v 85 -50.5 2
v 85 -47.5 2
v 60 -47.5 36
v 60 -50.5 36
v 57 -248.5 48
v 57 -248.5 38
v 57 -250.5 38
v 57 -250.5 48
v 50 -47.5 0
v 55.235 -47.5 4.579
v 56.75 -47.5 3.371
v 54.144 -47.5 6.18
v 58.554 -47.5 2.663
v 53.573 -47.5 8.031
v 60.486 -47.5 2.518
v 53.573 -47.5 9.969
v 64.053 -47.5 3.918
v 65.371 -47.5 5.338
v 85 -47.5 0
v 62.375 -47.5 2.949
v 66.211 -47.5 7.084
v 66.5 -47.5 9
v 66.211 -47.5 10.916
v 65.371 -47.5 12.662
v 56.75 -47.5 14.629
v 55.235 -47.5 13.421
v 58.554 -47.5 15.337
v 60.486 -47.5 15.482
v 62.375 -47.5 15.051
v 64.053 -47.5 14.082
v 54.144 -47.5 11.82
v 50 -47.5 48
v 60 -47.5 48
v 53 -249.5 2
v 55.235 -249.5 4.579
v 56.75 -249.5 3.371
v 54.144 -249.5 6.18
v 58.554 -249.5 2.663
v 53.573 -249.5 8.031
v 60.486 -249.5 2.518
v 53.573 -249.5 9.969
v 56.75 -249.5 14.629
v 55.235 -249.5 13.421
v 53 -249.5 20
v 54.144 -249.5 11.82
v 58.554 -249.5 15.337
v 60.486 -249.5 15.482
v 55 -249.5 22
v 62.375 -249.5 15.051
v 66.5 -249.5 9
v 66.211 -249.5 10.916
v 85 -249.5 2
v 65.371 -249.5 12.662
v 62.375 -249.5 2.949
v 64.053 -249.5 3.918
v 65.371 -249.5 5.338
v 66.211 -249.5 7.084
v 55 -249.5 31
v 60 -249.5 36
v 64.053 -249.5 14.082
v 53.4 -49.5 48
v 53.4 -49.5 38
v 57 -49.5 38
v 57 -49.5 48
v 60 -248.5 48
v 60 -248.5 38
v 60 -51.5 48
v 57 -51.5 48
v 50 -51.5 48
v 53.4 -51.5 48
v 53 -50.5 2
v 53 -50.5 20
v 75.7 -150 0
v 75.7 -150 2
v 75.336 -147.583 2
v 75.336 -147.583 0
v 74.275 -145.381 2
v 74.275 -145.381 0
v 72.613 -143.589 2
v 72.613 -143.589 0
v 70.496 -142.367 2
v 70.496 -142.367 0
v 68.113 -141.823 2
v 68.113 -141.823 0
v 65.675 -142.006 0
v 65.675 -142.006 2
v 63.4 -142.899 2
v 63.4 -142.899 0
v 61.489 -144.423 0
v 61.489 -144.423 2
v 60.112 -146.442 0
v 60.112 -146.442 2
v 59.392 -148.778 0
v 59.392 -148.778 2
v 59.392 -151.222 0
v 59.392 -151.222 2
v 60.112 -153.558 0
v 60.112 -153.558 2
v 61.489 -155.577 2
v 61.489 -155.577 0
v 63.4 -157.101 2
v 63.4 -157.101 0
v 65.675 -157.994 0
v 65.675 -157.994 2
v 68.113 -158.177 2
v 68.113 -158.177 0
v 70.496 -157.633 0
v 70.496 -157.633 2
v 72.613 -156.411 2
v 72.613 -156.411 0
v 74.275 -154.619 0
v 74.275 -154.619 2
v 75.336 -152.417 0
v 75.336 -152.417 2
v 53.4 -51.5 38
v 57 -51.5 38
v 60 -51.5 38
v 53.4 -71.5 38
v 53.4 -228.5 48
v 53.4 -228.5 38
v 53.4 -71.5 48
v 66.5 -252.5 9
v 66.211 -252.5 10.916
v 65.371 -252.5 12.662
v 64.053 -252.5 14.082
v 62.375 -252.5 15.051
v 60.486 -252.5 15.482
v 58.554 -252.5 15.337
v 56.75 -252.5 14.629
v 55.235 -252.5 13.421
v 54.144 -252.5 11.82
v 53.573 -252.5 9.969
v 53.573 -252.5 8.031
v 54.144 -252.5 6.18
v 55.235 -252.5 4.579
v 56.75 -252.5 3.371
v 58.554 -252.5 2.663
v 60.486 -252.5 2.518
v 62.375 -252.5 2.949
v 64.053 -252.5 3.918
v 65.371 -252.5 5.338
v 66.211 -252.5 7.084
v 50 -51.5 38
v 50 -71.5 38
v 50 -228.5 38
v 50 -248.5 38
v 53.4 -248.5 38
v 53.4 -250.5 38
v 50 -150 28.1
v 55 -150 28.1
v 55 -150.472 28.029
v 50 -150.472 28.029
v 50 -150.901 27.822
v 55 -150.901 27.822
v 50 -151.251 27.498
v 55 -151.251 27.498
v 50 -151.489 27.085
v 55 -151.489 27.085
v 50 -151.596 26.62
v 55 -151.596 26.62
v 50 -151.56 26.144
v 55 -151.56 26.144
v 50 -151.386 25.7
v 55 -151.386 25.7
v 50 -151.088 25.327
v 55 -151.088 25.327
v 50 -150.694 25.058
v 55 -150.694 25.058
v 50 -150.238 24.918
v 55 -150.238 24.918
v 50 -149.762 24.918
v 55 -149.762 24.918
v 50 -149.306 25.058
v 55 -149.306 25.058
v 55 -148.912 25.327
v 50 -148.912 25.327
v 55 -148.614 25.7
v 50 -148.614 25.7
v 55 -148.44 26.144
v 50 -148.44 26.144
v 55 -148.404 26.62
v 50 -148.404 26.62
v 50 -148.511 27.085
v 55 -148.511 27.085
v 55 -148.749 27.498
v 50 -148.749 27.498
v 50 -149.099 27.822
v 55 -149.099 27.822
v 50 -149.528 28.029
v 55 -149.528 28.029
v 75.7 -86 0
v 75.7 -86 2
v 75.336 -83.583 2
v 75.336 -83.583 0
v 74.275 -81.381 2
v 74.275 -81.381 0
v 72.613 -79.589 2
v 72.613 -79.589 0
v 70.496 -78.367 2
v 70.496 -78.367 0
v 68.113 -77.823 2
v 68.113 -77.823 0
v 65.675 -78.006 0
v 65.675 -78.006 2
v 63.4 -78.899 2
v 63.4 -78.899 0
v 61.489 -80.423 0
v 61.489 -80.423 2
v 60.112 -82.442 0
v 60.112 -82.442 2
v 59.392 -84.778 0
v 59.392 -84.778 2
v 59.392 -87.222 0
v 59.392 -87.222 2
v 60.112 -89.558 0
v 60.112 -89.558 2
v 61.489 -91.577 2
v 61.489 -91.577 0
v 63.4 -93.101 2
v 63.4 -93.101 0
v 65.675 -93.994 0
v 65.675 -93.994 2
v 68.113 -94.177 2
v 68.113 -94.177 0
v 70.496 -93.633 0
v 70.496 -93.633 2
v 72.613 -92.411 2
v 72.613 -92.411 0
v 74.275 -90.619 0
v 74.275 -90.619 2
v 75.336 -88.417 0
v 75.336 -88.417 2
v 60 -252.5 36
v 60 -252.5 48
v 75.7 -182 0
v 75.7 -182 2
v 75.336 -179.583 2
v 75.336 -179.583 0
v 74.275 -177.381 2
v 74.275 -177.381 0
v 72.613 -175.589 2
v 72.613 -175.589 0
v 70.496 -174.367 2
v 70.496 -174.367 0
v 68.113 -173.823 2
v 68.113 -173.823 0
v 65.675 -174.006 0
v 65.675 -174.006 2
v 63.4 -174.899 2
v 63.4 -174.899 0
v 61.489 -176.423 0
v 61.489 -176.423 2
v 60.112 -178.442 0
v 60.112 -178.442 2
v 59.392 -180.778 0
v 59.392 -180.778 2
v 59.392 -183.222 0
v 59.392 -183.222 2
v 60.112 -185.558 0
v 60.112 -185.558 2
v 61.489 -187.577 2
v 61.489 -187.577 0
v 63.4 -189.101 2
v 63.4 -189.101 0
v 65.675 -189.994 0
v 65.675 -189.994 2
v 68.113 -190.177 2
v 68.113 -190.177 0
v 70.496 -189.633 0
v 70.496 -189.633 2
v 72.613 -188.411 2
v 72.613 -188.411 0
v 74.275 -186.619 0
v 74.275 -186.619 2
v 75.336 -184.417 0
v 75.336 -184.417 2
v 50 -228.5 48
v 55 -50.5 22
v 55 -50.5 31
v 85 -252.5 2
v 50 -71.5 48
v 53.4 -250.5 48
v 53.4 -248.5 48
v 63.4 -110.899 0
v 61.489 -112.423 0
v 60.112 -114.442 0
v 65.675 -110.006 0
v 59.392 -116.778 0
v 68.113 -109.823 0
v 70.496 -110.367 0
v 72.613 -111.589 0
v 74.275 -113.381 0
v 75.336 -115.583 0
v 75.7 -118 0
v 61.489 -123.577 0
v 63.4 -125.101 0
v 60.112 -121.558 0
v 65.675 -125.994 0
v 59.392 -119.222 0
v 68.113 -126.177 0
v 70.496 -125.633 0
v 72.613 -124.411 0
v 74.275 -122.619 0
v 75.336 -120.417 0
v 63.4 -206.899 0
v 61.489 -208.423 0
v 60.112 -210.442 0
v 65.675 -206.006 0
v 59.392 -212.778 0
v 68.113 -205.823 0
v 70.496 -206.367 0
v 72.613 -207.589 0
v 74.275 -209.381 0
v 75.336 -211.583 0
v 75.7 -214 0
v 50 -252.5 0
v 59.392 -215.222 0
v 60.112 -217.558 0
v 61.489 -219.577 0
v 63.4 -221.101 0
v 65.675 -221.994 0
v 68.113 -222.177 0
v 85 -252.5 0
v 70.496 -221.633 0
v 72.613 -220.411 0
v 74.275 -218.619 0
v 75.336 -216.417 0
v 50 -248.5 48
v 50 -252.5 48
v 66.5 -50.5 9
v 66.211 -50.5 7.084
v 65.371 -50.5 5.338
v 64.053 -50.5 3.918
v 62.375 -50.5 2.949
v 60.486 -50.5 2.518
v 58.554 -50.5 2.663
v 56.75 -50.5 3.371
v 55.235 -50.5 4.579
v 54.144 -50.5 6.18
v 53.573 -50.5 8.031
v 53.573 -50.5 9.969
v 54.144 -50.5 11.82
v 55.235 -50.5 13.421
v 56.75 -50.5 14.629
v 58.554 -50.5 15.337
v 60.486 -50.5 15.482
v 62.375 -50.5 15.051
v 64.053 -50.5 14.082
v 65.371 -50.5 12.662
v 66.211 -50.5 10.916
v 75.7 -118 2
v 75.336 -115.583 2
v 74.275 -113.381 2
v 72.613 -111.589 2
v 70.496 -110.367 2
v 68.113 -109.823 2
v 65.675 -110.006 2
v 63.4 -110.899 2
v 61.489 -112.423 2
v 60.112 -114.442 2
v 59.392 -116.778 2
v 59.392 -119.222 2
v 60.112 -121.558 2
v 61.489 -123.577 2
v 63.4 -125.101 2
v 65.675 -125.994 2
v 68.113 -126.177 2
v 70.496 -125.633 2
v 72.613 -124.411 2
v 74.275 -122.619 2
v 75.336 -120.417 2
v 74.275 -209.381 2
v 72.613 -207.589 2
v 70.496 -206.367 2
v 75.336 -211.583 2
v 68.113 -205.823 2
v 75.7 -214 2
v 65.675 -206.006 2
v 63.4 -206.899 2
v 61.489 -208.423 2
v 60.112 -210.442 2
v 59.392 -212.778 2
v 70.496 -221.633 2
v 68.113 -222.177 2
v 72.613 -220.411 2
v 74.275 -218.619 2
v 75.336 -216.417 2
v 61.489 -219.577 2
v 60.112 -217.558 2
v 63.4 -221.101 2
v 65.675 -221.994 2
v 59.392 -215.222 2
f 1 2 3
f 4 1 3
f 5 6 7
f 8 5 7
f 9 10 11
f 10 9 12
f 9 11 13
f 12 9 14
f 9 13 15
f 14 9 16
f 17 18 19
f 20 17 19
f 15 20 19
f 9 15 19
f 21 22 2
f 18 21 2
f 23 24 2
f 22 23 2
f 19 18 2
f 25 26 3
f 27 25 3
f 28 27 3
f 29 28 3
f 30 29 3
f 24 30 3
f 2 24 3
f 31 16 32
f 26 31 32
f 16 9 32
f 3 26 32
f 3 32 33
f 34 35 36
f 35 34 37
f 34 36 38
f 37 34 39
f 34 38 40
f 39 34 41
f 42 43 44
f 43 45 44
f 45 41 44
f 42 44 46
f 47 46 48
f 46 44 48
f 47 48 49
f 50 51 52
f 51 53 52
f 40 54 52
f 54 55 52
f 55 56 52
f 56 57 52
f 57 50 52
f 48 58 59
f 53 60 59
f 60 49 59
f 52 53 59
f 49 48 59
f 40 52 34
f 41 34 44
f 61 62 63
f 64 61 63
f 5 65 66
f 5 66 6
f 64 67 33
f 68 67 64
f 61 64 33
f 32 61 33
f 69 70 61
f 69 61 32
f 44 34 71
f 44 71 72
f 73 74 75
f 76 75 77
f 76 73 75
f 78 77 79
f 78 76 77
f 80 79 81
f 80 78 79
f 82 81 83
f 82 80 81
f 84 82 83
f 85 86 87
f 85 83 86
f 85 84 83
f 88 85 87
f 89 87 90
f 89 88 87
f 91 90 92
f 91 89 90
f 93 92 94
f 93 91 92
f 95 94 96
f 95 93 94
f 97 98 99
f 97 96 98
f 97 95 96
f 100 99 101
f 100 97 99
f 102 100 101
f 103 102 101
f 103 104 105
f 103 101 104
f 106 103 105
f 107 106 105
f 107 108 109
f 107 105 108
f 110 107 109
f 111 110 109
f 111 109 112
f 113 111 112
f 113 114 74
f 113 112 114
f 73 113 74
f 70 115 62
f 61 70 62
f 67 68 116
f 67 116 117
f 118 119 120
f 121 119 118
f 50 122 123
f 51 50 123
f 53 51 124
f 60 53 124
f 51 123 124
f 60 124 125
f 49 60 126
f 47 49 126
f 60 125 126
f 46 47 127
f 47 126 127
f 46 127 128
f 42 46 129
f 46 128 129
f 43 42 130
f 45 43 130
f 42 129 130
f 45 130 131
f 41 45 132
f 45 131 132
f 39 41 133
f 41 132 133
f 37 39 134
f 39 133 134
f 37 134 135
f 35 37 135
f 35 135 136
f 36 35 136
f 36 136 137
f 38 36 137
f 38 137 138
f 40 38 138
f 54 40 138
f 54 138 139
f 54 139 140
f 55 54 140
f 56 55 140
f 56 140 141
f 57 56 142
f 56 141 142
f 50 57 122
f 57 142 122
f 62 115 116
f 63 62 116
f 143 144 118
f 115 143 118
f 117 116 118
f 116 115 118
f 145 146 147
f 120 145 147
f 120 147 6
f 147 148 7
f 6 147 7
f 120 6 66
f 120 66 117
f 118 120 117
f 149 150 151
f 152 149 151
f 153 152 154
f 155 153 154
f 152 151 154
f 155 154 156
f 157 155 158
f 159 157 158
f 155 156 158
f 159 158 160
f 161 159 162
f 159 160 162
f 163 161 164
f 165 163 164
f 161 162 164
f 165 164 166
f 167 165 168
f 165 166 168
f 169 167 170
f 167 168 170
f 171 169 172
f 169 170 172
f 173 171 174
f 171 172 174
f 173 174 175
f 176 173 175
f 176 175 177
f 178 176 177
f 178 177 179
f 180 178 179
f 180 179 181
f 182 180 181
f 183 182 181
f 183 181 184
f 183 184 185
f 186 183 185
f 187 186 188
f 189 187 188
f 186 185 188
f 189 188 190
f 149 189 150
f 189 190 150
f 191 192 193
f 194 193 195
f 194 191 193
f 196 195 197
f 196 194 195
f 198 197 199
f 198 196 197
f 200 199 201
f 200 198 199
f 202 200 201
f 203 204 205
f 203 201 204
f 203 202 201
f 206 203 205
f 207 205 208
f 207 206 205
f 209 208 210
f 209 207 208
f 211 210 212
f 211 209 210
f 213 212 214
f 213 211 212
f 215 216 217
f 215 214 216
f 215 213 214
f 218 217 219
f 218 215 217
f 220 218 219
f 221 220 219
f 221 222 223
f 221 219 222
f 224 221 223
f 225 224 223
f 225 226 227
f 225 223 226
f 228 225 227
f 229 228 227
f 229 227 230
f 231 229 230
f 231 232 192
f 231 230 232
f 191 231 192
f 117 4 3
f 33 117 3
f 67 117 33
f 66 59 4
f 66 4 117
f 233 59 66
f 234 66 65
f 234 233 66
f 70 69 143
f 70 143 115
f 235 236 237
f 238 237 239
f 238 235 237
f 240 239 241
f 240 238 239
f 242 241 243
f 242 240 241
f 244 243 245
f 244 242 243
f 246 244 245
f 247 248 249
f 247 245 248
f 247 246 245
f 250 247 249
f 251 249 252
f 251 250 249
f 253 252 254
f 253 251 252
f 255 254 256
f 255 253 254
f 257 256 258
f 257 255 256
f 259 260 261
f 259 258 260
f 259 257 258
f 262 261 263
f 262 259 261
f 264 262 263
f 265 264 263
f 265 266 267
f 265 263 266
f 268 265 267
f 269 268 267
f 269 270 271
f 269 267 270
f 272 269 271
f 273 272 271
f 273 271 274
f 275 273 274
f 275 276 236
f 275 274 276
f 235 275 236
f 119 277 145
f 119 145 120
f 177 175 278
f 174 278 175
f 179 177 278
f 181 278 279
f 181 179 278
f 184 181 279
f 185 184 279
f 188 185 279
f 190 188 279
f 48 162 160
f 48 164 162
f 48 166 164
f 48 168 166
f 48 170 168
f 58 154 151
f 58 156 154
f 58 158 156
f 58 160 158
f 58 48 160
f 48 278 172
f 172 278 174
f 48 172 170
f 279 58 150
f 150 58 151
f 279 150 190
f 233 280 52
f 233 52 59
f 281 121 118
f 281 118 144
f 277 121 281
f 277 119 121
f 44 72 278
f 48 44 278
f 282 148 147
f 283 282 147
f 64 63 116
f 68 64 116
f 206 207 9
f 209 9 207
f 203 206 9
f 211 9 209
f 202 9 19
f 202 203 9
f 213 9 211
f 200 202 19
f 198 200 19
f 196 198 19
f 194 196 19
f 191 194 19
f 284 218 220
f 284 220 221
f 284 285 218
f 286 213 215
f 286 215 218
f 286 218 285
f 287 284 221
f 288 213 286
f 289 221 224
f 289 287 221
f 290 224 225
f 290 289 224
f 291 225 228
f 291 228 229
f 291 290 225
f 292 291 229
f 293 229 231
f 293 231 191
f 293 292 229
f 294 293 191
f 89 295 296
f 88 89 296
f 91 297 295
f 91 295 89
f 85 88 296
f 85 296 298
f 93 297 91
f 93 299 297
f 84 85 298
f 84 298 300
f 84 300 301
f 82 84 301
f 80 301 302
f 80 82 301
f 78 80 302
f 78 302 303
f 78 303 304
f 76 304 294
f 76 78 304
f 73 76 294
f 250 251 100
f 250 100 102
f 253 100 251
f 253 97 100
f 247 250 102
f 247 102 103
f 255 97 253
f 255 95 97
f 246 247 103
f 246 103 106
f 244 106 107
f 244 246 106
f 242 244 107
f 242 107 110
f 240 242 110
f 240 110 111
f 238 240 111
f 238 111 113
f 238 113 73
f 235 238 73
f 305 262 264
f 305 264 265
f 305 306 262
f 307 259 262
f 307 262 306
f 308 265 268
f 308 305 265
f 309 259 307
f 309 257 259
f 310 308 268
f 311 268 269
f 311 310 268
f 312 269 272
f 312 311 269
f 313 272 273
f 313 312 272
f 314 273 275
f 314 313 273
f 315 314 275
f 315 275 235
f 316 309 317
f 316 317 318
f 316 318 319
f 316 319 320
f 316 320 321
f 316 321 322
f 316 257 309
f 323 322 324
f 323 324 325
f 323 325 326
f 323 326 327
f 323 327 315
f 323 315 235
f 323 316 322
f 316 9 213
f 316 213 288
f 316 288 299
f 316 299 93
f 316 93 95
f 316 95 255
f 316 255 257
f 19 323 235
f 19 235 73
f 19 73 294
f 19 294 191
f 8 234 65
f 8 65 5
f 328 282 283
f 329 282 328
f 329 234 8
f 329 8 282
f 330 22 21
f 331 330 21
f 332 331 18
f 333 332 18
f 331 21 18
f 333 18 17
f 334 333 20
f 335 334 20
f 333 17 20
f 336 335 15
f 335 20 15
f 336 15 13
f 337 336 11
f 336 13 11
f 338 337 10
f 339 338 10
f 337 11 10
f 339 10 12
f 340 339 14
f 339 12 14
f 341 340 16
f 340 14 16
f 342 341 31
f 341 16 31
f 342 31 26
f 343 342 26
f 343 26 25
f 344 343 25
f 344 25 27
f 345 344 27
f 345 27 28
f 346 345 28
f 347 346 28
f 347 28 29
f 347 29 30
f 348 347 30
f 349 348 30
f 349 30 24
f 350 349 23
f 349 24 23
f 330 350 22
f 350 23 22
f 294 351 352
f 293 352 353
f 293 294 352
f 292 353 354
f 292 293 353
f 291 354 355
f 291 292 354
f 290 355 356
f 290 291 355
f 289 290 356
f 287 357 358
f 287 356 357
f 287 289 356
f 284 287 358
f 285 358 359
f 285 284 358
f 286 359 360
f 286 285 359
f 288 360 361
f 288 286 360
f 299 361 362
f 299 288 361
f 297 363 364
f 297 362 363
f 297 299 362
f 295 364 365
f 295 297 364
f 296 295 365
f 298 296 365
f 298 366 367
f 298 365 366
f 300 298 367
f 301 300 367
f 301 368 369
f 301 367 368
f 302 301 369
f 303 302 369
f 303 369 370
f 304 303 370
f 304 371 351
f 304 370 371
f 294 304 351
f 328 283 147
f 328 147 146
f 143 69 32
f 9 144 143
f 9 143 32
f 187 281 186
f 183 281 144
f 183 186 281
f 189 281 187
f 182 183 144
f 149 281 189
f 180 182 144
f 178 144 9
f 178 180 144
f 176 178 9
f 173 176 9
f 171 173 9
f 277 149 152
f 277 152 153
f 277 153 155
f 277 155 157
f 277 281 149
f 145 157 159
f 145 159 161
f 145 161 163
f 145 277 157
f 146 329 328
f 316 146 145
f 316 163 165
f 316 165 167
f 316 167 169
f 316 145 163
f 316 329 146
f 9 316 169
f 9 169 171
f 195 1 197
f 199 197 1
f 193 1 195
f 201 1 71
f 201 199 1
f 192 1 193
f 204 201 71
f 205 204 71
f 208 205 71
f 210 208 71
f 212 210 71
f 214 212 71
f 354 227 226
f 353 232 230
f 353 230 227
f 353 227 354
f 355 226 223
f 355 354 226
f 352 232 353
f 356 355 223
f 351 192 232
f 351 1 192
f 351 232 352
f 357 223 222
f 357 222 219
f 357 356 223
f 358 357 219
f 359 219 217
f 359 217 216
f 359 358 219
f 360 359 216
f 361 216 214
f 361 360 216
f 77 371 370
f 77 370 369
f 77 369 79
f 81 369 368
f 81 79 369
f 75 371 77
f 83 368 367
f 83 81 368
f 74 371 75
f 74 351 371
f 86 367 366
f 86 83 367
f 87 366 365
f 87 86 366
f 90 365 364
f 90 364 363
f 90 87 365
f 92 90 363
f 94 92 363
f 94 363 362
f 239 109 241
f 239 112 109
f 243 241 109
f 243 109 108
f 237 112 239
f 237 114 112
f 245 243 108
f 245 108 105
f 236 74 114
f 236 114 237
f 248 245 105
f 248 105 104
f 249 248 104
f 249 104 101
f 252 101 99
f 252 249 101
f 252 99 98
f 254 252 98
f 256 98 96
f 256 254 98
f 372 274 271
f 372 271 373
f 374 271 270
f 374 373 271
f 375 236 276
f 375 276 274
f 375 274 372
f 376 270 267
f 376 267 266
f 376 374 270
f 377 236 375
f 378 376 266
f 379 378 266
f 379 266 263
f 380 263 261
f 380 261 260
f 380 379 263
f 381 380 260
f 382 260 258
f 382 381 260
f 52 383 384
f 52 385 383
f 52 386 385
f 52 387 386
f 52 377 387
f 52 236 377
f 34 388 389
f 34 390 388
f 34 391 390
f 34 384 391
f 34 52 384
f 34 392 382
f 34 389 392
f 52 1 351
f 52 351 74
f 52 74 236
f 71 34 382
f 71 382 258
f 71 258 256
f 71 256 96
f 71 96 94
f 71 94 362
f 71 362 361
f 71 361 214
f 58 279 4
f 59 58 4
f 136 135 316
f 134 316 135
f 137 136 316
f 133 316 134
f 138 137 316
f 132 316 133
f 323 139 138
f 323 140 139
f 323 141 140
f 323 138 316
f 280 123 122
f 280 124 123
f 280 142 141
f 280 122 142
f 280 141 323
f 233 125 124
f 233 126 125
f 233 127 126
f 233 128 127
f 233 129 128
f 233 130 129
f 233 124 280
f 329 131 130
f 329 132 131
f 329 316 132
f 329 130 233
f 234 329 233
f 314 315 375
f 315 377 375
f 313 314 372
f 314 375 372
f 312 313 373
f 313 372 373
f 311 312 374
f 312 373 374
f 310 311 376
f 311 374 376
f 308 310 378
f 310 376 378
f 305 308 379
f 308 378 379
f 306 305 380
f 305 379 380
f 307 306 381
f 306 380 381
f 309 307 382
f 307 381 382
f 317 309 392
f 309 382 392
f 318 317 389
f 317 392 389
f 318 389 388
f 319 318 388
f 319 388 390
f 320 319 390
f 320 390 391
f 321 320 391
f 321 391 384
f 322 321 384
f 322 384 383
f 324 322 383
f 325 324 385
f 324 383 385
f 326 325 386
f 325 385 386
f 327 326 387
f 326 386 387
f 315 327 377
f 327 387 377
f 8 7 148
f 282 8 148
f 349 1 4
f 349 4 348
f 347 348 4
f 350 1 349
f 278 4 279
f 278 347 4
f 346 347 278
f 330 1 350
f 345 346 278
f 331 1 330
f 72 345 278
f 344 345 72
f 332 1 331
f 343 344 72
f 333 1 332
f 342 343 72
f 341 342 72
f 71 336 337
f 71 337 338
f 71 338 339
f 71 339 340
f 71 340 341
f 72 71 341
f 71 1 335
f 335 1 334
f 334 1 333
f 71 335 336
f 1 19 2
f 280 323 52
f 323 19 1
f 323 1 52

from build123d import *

# Parameters (mm, degrees)
PAD001_DEPTH    = 102.5
POCKET002_DEPTH = 10
SKETCH007_R     = 1.6
POCKET005_DEPTH = 5
SKETCH008_R     = 8.2
POCKET006_DEPTH = 2.5
SKETCH026_R     = 6.5
PAD010_DEPTH    = 3
SKETCH027_R     = 6.5
PAD011_DEPTH    = 3


with BuildPart() as part:
    # Sketch003 → Pad001 (new body, symmetric)
    with BuildSketch(Plane.XZ):
        Polygon((0, 0), (35, 0), (35, 2), (3, 2), (3, 20), (5, 22), (5, 31), (10, 36), (10, 48), (0, 48), align=None)
    extrude(amount=PAD001_DEPTH, both=True)

    # Sketch004 (on Face9 of Pad001) → Pocket002 (cut)
    with BuildSketch(Plane(origin=(0, 0, 48), x_dir=(-1, 0, 0), z_dir=(0, 0, 1))):
        Polygon((-10, 98.5), (-7, 98.5), (-7, 100.5), (-3.4, 100.5), (-3.4, 98.5), (0, 98.5), (0, 78.5), (-3.4, 78.5), (-3.4, -78.5), (0, -78.5), (0, -98.5), (-3.4, -98.5), (-3.4, -100.5), (-7, -100.5), (-7, -98.5), (-10, -98.5), align=None)
    extrude(amount=-POCKET002_DEPTH, mode=Mode.SUBTRACT)

    # Sketch007 (on Face17 of Pocket002) → Pocket005 (cut)
    with BuildSketch(Plane(origin=(5, 0, 0), x_dir=(0, 0, 1), z_dir=(1, 0, 0))):
        with Locations((26.5, 0)):
            Circle(SKETCH007_R)
    extrude(amount=-POCKET005_DEPTH, mode=Mode.SUBTRACT)

    # Sketch008 → Pocket006 (cut, symmetric)
    with BuildSketch(Plane.XY):
        with Locations((17.5, 0)):
            Circle(SKETCH008_R)
        with Locations((17.5, 64)):
            Circle(SKETCH008_R)
        with Locations((17.5, 32)):
            Circle(SKETCH008_R)
        with Locations((17.5, -32)):
            Circle(SKETCH008_R)
        with Locations((17.5, -64)):
            Circle(SKETCH008_R)
    extrude(amount=POCKET006_DEPTH, both=True, mode=Mode.SUBTRACT)

    # Sketch026 (on Face3 of Pocket006) → Pad010 (join)
    with BuildSketch(Plane(origin=(0, 102.5, 0), x_dir=(1, 0, 0), z_dir=(0, 1, 0))):
        Polygon((0, -36), (0, 0), (35, 0), (35, -2), (10, -36), align=None)
        with Locations((10, -9)):
            Circle(SKETCH026_R, mode=Mode.SUBTRACT)
    extrude(amount=-PAD010_DEPTH)

    # Sketch027 (on Face1 of Pad010) → Pad011 (join)
    with BuildSketch(Plane.XZ.offset(102.5)):
        Polygon((35, 2), (10, 36), (0, 36), (0, 0), (35, 0), align=None)
        with Locations((10, 9)):
            Circle(SKETCH027_R, mode=Mode.SUBTRACT)
    extrude(amount=-PAD011_DEPTH)


with BuildPart() as part_1:
    # Body001 placement: moved
    add(part.part.moved(Location((50, -150, 0))))


solid = part_1.part
